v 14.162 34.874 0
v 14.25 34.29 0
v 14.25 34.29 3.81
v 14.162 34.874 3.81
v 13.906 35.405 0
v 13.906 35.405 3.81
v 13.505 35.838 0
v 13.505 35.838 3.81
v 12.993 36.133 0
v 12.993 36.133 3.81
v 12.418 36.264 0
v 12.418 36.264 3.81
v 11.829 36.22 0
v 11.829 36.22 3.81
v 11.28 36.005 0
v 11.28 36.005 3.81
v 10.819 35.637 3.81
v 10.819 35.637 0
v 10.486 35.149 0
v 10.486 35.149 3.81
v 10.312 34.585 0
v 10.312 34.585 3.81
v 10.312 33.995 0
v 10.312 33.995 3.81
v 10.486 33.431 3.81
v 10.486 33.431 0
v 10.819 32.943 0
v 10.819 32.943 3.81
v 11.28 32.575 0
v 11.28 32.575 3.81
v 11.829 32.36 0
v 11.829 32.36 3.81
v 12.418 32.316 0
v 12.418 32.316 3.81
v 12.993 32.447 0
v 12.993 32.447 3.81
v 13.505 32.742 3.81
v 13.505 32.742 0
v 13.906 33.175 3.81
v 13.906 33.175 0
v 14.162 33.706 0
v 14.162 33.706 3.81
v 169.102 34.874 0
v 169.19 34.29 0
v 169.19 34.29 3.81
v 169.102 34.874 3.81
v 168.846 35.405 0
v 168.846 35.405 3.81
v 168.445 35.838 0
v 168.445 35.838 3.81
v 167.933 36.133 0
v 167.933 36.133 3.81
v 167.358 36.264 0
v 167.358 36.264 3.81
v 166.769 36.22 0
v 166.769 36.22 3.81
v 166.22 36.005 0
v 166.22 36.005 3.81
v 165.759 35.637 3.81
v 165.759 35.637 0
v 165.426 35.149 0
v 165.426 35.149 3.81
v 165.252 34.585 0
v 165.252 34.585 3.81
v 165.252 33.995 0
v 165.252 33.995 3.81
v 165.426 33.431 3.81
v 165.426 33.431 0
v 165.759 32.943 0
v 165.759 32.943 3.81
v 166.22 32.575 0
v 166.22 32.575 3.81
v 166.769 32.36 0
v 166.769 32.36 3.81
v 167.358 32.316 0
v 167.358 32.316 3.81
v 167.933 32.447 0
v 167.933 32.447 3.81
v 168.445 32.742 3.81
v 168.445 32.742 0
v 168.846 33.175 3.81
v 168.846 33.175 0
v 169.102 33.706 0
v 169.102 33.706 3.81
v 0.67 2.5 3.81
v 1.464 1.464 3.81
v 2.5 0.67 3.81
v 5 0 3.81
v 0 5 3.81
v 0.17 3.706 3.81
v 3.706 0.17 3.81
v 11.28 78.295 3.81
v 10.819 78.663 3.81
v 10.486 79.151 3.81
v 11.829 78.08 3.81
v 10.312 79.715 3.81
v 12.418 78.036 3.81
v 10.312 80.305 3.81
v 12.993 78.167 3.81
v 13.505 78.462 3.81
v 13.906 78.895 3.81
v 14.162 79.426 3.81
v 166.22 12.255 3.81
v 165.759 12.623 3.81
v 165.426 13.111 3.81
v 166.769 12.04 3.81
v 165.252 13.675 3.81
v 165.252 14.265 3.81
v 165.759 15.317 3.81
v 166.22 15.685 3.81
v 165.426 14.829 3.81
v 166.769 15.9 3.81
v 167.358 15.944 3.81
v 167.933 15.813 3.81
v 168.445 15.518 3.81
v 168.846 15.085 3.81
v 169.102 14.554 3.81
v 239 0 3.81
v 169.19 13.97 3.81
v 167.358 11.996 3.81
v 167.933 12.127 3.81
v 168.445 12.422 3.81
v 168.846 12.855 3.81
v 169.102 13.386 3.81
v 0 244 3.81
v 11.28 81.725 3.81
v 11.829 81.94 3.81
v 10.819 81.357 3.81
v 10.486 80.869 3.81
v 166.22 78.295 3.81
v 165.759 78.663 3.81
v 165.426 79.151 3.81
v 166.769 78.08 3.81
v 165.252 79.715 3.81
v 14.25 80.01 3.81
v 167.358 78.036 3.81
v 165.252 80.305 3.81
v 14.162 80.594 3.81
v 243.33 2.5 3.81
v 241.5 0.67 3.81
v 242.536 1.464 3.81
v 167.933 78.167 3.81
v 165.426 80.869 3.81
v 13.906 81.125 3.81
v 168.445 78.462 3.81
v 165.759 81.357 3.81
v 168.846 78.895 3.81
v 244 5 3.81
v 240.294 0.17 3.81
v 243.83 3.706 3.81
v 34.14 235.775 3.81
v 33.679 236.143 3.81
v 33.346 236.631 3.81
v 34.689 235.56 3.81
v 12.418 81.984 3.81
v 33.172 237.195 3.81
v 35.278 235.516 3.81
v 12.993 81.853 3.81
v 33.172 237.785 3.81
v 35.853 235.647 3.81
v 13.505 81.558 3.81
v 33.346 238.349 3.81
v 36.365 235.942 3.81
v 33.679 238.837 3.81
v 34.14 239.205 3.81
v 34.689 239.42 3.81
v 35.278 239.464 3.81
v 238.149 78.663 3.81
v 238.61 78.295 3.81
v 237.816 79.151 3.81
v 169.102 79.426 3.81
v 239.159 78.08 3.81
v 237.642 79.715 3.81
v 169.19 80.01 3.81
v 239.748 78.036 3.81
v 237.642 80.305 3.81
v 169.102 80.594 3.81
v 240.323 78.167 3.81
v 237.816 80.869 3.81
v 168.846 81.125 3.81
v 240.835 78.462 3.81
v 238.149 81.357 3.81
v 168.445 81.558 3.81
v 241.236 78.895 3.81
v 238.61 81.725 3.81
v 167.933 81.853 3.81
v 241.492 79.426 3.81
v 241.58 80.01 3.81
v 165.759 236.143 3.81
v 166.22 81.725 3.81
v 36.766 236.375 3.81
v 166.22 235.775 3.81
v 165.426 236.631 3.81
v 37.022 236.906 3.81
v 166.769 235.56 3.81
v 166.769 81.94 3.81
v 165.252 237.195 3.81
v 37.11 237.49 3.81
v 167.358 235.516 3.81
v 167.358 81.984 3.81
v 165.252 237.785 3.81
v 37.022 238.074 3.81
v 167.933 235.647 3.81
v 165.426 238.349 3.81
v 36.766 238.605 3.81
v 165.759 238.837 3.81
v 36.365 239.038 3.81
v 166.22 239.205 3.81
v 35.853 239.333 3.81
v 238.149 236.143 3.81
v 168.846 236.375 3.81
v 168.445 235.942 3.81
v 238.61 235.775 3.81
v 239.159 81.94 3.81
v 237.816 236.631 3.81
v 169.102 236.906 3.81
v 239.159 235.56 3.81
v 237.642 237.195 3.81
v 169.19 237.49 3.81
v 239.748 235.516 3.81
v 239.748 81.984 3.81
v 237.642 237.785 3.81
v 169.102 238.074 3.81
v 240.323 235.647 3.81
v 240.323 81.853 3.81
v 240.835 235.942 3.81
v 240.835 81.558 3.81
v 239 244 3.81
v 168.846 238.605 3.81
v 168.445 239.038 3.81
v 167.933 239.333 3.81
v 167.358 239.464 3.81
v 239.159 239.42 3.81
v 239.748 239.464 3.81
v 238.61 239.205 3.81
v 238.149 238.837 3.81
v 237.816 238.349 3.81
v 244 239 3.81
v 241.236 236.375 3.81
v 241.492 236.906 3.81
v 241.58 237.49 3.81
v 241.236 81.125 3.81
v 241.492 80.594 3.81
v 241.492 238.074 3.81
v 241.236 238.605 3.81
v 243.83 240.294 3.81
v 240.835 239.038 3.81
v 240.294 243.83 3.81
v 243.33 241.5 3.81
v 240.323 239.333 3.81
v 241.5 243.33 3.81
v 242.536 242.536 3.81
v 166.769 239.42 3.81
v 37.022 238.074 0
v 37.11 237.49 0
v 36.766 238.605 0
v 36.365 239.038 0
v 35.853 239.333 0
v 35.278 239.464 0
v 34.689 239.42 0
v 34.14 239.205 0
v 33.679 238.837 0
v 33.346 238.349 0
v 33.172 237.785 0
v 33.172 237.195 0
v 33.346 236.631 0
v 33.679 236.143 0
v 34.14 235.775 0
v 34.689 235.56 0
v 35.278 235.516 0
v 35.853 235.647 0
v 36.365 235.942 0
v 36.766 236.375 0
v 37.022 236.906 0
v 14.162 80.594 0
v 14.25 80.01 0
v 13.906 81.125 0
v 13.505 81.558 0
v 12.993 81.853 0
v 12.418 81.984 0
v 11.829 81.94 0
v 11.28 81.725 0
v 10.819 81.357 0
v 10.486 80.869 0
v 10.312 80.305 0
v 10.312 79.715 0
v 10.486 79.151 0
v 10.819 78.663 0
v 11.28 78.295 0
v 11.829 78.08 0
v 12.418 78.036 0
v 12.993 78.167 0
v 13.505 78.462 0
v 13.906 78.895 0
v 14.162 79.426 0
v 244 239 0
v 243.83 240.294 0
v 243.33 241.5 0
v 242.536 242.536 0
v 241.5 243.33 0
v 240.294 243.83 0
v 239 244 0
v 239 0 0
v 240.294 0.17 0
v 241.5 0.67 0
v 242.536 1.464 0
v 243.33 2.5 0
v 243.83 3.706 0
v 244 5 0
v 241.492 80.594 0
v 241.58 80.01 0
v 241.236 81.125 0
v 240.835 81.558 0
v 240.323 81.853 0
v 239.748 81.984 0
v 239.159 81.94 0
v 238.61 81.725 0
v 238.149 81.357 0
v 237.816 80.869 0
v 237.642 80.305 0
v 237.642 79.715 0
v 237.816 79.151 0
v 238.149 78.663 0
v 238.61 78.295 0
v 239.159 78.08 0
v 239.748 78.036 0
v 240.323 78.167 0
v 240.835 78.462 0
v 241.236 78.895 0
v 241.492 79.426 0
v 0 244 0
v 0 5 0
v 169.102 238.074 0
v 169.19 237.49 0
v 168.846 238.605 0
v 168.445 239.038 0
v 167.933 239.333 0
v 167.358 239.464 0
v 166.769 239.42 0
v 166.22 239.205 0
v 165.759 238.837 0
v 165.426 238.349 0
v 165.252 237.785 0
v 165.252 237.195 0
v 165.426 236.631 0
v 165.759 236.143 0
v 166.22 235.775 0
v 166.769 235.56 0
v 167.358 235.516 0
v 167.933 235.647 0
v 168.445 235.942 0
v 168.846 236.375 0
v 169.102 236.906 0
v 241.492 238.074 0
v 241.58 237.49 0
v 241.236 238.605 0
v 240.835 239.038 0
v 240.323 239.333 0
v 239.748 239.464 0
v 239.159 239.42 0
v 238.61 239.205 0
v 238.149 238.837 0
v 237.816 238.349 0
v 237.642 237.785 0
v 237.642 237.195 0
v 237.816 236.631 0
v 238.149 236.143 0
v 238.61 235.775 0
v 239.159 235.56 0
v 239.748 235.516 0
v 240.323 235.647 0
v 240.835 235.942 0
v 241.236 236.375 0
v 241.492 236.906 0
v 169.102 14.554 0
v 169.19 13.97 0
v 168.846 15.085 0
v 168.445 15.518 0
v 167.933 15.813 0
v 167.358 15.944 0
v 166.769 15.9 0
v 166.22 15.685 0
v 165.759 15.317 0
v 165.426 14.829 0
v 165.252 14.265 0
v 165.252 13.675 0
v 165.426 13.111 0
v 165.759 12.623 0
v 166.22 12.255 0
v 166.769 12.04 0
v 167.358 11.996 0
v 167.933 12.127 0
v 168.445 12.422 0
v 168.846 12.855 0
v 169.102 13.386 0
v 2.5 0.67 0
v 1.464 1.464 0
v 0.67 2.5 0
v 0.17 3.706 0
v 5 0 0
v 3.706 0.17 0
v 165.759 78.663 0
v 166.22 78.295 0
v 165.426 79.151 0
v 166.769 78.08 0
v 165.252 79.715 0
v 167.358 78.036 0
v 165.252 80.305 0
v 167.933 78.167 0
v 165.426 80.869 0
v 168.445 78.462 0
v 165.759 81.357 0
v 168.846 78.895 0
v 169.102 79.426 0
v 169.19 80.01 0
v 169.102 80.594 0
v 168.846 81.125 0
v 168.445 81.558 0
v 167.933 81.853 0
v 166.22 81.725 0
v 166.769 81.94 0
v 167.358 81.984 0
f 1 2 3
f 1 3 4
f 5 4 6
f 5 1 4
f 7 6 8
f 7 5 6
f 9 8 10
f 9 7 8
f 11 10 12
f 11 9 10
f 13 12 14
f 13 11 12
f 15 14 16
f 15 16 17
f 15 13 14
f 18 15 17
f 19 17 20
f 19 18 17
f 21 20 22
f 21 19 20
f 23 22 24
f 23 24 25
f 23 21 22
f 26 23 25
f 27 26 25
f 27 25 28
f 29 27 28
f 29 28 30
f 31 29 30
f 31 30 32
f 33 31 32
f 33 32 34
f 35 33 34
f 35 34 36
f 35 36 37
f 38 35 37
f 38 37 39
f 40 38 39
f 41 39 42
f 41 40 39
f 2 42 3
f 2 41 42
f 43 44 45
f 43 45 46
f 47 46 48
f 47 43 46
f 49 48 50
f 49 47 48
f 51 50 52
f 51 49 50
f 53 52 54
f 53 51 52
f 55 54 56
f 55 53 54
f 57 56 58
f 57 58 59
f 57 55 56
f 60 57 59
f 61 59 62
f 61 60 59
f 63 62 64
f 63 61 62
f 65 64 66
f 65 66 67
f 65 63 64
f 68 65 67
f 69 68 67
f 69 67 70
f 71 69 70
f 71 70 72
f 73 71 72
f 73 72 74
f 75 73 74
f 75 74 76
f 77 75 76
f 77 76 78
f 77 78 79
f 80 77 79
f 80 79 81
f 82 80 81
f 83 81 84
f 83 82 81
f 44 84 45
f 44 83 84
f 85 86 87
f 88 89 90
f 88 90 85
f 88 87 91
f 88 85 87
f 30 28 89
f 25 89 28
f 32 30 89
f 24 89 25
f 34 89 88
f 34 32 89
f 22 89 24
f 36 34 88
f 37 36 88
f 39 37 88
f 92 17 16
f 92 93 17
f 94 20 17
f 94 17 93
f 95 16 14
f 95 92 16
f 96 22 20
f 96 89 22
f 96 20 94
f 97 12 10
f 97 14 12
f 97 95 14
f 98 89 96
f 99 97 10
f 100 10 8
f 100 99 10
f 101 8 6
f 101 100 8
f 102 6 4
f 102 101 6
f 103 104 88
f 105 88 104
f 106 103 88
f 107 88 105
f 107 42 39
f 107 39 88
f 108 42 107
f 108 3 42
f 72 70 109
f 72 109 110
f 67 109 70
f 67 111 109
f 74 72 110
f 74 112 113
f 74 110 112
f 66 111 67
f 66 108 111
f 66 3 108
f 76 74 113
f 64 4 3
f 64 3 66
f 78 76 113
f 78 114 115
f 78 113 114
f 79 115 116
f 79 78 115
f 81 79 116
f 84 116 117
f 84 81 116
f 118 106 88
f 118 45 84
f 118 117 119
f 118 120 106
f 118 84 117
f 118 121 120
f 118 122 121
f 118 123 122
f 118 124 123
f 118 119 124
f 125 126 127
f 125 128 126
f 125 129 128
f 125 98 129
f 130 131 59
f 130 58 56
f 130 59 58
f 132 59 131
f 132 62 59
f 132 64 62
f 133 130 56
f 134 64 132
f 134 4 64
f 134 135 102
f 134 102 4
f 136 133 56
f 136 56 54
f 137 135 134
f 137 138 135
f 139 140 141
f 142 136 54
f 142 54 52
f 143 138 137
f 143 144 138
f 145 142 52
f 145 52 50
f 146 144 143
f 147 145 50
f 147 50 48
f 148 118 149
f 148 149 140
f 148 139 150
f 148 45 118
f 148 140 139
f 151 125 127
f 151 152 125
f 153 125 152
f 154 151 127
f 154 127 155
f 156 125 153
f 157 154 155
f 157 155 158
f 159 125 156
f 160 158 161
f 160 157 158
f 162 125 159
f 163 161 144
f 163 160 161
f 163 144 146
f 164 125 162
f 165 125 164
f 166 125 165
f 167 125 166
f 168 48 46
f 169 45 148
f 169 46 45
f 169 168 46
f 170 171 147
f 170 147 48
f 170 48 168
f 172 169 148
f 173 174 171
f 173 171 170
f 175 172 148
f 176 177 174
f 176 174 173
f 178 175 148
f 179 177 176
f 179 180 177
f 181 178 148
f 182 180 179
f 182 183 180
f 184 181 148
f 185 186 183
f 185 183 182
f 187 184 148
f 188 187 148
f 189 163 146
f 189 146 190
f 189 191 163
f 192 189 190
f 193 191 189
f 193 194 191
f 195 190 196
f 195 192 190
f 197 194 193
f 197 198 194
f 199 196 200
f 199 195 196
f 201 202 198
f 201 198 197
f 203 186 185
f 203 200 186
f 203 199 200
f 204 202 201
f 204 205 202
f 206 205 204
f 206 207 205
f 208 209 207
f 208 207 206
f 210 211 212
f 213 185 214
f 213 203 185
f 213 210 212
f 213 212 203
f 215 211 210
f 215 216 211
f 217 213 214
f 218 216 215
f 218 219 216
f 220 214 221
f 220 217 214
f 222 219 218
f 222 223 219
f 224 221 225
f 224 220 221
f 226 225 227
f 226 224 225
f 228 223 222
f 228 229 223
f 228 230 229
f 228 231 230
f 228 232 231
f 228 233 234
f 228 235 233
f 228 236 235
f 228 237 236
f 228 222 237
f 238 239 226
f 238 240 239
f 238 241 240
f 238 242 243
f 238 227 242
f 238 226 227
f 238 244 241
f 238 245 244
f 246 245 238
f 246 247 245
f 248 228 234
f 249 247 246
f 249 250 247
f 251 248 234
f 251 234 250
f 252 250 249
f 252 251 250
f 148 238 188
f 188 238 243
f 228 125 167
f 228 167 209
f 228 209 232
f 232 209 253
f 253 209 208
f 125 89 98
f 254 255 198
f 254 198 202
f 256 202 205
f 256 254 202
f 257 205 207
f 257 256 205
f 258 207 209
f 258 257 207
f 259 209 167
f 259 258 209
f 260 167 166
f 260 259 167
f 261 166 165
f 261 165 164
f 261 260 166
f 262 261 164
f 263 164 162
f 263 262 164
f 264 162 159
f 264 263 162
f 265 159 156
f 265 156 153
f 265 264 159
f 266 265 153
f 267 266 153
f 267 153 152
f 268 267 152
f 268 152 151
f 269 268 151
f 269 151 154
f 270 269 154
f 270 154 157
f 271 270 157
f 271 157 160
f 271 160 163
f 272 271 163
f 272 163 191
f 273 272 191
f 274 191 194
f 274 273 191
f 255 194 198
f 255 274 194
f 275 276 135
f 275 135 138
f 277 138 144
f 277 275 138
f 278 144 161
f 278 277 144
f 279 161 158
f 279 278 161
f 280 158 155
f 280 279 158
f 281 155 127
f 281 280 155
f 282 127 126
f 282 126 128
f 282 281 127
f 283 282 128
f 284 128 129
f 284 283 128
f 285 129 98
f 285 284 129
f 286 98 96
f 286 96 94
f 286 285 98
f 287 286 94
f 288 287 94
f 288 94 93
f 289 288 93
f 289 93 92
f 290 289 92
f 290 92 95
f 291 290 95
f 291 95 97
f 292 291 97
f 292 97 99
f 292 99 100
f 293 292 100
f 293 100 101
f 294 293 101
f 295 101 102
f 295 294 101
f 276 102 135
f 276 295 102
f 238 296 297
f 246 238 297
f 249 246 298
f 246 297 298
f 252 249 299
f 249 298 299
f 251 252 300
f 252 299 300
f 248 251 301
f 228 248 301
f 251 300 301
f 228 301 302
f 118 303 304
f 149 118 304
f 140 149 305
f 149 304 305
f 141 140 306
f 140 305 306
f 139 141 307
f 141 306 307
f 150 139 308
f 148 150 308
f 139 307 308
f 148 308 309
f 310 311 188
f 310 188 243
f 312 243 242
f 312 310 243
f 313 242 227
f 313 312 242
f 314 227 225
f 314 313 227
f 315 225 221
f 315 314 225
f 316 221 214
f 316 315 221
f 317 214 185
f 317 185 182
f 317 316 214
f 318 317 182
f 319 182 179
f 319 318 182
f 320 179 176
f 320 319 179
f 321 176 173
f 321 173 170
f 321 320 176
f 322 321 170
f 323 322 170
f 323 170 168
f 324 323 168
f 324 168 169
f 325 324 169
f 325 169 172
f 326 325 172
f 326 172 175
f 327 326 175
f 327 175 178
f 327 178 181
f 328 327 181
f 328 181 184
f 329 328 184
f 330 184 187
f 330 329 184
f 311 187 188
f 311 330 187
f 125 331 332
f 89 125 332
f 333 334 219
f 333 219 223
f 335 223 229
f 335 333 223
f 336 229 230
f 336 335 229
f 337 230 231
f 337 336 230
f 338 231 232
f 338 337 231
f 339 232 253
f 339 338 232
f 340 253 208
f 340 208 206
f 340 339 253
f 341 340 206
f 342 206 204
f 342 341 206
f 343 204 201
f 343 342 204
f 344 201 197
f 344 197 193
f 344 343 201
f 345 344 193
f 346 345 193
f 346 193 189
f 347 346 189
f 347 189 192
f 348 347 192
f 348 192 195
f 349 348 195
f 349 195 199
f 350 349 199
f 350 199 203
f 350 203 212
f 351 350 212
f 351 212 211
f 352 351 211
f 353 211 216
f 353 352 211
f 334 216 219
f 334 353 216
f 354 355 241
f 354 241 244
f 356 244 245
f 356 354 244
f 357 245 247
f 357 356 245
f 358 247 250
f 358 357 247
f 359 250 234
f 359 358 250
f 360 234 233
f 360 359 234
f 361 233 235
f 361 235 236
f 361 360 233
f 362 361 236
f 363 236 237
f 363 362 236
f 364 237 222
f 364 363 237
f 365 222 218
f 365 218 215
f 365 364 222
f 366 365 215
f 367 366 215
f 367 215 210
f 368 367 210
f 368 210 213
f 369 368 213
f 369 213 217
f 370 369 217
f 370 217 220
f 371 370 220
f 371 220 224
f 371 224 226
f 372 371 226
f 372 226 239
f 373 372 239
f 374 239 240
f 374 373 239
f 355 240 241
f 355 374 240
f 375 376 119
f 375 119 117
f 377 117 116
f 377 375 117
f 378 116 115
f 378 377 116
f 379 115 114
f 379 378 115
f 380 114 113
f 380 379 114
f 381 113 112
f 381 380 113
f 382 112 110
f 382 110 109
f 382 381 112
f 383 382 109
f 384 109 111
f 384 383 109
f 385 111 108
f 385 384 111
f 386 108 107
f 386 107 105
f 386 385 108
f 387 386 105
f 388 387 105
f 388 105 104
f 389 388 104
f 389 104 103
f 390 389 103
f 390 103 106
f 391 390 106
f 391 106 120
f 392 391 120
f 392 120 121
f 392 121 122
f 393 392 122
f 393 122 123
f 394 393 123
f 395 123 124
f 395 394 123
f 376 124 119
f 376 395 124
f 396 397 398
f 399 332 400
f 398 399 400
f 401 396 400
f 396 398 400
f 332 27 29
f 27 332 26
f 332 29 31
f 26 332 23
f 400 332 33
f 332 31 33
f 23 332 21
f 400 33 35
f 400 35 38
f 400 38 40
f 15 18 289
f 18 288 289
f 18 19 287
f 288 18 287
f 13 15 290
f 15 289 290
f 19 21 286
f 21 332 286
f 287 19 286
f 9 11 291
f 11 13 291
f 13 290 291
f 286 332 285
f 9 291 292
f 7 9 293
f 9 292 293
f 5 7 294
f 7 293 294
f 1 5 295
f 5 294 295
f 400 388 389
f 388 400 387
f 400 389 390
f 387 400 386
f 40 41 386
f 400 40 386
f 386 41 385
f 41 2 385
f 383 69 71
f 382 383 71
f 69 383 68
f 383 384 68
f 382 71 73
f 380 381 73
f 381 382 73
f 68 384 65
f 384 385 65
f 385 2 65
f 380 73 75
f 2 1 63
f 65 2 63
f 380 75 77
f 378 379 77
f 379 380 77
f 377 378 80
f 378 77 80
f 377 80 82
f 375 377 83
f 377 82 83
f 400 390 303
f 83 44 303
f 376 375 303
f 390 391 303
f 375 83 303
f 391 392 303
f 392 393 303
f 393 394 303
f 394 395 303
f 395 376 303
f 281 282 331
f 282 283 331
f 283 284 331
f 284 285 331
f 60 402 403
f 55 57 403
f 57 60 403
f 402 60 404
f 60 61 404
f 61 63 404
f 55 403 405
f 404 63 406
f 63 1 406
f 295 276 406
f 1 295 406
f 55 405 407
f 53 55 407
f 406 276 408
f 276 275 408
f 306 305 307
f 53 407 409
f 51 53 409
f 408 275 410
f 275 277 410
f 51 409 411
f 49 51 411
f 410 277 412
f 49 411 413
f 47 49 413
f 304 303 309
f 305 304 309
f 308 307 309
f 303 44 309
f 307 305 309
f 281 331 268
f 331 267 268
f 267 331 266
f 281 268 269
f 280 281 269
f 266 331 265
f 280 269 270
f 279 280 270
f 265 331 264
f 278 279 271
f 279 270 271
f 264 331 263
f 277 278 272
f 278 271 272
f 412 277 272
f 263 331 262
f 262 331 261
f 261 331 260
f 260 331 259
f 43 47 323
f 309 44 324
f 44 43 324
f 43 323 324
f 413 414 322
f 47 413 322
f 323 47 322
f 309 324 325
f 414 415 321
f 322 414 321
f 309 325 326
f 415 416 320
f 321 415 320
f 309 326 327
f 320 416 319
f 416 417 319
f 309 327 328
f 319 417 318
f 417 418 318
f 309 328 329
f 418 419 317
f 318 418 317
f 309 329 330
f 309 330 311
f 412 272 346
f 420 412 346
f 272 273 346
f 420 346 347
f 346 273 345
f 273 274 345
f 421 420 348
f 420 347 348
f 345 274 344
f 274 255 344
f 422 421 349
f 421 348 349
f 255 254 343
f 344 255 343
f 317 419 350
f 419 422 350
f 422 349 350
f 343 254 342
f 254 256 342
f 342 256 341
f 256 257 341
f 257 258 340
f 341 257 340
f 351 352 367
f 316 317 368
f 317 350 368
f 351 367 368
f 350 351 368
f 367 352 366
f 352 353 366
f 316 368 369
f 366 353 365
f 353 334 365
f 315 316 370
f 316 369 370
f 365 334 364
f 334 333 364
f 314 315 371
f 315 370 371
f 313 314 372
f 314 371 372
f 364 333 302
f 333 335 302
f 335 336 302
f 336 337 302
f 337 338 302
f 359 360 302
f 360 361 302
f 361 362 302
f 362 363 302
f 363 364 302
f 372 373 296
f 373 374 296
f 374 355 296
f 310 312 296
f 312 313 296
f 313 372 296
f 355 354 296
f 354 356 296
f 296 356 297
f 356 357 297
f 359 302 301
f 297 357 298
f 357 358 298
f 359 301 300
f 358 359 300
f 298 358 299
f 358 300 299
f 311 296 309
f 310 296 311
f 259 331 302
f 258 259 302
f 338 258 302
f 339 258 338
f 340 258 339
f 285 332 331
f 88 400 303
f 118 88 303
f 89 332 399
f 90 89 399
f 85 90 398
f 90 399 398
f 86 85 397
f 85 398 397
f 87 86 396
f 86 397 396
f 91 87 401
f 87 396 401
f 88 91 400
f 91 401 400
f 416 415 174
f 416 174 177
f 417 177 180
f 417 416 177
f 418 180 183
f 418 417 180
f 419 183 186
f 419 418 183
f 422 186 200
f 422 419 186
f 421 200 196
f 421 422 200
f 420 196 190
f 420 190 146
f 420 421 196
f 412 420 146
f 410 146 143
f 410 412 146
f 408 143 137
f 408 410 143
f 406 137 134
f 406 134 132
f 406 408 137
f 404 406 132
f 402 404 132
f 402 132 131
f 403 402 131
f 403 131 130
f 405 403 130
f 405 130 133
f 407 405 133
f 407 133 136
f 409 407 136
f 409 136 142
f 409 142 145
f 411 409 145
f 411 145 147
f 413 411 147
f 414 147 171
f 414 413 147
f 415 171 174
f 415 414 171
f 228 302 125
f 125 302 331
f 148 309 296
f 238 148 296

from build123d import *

# Parameters (mm, degrees)
F0_R     = 1.98
F0_W     = 103.5421602428
F0_H     = 6.8848114461
F0_W_2   = 8.5047781467
F0_H_2   = 22.0043957233
F0_W_3   = 28.3794738352
F0_H_3   = 70.3811049461
F0_W_4   = 42.310371995
F0_H_4   = 43.9875721931
F0_W_5   = 6.8728923798
F0_H_5   = 133.4486082196
F0_W_6   = 70.3811049461
F0_H_6   = 22.2639712095
F0_W_7   = 22.4677734077
F0_H_7   = 158.75
F1_DEPTH = 3.81


# Not quite as in the source:
# - a feature of the source that left no trace in its solid (it failed there, or was rolled back) is left out


with BuildPart() as f1:
    # F0 (on Top) → F1 (new body)
    with BuildSketch(Plane.XY):
        with BuildLine():
            ThreePointArc((0, 5), (1.4644660941, 1.4644660941), (5, 0))
            Line((5, 0), (239, 0))
            ThreePointArc((239, 0), (242.5355339059, 1.4644660941), (244, 5))
            Line((244, 5), (244, 239))
            ThreePointArc((244, 239), (242.5355339059, 242.5355339059), (239, 244))
            Line((239, 244), (155.4765701294, 244))
            Line((155.4765701294, 244), (155.4765701294, 221.7360287905))
            Line((155.4765701294, 221.7360287905), (85.0954651833, 221.7360287905))
            Line((85.0954651833, 221.7360287905), (85.0954651833, 244))
            Line((85.0954651833, 244), (22.4677734077, 244))
            Line((22.4677734077, 244), (22.4677734077, 85.25))
            Line((22.4677734077, 85.25), (0, 85.25))
            Line((0, 85.25), (0, 5))
        make_face()
        with Locations((12.27, 34.29)):
            Circle(F0_R, mode=Mode.SUBTRACT)
        with Locations((94.4036040455, 18.8242988661)):
            Rectangle(F0_W, F0_H, mode=Mode.SUBTRACT)
        with Locations((12.27, 80.01)):
            Circle(F0_R, mode=Mode.SUBTRACT)
        with Locations((167.21, 13.97)):
            Circle(F0_R, mode=Mode.SUBTRACT)
        with Locations((167.21, 34.29)):
            Circle(F0_R, mode=Mode.SUBTRACT)
        with Locations((152.7901440859, 81.0341909528)):
            Rectangle(F0_W_2, F0_H_2, mode=Mode.SUBTRACT)
        with Locations((167.21, 80.01)):
            Circle(F0_R, mode=Mode.SUBTRACT)
        with Locations((239.6, 80.01)):
            Circle(F0_R, mode=Mode.SUBTRACT)
        with Locations((56.3754346222, 171.5611219406)):
            Rectangle(F0_W_3, F0_H_3, mode=Mode.SUBTRACT)
        with Locations((35.13, 237.49)):
            Circle(F0_R, mode=Mode.SUBTRACT)
        with Locations((123.8708272576, 159.014120698)):
            Rectangle(F0_W_4, F0_H_4, mode=Mode.SUBTRACT)
        with Locations((180.2064478397, 157.2181545198)):
            Rectangle(F0_W_5, F0_H_5, mode=Mode.SUBTRACT)
        with Locations((189.3064478397, 157.2181545198)):
            Rectangle(F0_W_5, F0_H_5, mode=Mode.SUBTRACT)
        with Locations((198.4064478397, 157.2181545198)):
            Rectangle(F0_W_5, F0_H_5, mode=Mode.SUBTRACT)
        with Locations((207.5064478397, 157.2181545198)):
            Rectangle(F0_W_5, F0_H_5, mode=Mode.SUBTRACT)
        with Locations((167.21, 237.49)):
            Circle(F0_R, mode=Mode.SUBTRACT)
        with Locations((239.6, 237.49)):
            Circle(F0_R, mode=Mode.SUBTRACT)
        with Locations((94.4036040455, 18.8242988661)):
            Rectangle(F0_W, F0_H)
        with Locations((152.7901440859, 81.0341909528)):
            Rectangle(F0_W_2, F0_H_2)
        with Locations((180.2064478397, 157.2181545198)):
            Rectangle(F0_W_5, F0_H_5)
        with Locations((189.3064478397, 157.2181545198)):
            Rectangle(F0_W_5, F0_H_5)
        with Locations((198.4064478397, 157.2181545198)):
            Rectangle(F0_W_5, F0_H_5)
        with Locations((207.5064478397, 157.2181545198)):
            Rectangle(F0_W_5, F0_H_5)
        with Locations((123.8708272576, 159.014120698)):
            Rectangle(F0_W_4, F0_H_4)
        with Locations((56.3754346222, 171.5611219406)):
            Rectangle(F0_W_3, F0_H_3)
        with Locations((120.2860176563, 232.8680143952)):
            Rectangle(F0_W_6, F0_H_6)
        with Locations((11.2338867038, 164.625)):
            Rectangle(F0_W_7, F0_H_7)
    extrude(amount=F1_DEPTH)


solid = f1.part
